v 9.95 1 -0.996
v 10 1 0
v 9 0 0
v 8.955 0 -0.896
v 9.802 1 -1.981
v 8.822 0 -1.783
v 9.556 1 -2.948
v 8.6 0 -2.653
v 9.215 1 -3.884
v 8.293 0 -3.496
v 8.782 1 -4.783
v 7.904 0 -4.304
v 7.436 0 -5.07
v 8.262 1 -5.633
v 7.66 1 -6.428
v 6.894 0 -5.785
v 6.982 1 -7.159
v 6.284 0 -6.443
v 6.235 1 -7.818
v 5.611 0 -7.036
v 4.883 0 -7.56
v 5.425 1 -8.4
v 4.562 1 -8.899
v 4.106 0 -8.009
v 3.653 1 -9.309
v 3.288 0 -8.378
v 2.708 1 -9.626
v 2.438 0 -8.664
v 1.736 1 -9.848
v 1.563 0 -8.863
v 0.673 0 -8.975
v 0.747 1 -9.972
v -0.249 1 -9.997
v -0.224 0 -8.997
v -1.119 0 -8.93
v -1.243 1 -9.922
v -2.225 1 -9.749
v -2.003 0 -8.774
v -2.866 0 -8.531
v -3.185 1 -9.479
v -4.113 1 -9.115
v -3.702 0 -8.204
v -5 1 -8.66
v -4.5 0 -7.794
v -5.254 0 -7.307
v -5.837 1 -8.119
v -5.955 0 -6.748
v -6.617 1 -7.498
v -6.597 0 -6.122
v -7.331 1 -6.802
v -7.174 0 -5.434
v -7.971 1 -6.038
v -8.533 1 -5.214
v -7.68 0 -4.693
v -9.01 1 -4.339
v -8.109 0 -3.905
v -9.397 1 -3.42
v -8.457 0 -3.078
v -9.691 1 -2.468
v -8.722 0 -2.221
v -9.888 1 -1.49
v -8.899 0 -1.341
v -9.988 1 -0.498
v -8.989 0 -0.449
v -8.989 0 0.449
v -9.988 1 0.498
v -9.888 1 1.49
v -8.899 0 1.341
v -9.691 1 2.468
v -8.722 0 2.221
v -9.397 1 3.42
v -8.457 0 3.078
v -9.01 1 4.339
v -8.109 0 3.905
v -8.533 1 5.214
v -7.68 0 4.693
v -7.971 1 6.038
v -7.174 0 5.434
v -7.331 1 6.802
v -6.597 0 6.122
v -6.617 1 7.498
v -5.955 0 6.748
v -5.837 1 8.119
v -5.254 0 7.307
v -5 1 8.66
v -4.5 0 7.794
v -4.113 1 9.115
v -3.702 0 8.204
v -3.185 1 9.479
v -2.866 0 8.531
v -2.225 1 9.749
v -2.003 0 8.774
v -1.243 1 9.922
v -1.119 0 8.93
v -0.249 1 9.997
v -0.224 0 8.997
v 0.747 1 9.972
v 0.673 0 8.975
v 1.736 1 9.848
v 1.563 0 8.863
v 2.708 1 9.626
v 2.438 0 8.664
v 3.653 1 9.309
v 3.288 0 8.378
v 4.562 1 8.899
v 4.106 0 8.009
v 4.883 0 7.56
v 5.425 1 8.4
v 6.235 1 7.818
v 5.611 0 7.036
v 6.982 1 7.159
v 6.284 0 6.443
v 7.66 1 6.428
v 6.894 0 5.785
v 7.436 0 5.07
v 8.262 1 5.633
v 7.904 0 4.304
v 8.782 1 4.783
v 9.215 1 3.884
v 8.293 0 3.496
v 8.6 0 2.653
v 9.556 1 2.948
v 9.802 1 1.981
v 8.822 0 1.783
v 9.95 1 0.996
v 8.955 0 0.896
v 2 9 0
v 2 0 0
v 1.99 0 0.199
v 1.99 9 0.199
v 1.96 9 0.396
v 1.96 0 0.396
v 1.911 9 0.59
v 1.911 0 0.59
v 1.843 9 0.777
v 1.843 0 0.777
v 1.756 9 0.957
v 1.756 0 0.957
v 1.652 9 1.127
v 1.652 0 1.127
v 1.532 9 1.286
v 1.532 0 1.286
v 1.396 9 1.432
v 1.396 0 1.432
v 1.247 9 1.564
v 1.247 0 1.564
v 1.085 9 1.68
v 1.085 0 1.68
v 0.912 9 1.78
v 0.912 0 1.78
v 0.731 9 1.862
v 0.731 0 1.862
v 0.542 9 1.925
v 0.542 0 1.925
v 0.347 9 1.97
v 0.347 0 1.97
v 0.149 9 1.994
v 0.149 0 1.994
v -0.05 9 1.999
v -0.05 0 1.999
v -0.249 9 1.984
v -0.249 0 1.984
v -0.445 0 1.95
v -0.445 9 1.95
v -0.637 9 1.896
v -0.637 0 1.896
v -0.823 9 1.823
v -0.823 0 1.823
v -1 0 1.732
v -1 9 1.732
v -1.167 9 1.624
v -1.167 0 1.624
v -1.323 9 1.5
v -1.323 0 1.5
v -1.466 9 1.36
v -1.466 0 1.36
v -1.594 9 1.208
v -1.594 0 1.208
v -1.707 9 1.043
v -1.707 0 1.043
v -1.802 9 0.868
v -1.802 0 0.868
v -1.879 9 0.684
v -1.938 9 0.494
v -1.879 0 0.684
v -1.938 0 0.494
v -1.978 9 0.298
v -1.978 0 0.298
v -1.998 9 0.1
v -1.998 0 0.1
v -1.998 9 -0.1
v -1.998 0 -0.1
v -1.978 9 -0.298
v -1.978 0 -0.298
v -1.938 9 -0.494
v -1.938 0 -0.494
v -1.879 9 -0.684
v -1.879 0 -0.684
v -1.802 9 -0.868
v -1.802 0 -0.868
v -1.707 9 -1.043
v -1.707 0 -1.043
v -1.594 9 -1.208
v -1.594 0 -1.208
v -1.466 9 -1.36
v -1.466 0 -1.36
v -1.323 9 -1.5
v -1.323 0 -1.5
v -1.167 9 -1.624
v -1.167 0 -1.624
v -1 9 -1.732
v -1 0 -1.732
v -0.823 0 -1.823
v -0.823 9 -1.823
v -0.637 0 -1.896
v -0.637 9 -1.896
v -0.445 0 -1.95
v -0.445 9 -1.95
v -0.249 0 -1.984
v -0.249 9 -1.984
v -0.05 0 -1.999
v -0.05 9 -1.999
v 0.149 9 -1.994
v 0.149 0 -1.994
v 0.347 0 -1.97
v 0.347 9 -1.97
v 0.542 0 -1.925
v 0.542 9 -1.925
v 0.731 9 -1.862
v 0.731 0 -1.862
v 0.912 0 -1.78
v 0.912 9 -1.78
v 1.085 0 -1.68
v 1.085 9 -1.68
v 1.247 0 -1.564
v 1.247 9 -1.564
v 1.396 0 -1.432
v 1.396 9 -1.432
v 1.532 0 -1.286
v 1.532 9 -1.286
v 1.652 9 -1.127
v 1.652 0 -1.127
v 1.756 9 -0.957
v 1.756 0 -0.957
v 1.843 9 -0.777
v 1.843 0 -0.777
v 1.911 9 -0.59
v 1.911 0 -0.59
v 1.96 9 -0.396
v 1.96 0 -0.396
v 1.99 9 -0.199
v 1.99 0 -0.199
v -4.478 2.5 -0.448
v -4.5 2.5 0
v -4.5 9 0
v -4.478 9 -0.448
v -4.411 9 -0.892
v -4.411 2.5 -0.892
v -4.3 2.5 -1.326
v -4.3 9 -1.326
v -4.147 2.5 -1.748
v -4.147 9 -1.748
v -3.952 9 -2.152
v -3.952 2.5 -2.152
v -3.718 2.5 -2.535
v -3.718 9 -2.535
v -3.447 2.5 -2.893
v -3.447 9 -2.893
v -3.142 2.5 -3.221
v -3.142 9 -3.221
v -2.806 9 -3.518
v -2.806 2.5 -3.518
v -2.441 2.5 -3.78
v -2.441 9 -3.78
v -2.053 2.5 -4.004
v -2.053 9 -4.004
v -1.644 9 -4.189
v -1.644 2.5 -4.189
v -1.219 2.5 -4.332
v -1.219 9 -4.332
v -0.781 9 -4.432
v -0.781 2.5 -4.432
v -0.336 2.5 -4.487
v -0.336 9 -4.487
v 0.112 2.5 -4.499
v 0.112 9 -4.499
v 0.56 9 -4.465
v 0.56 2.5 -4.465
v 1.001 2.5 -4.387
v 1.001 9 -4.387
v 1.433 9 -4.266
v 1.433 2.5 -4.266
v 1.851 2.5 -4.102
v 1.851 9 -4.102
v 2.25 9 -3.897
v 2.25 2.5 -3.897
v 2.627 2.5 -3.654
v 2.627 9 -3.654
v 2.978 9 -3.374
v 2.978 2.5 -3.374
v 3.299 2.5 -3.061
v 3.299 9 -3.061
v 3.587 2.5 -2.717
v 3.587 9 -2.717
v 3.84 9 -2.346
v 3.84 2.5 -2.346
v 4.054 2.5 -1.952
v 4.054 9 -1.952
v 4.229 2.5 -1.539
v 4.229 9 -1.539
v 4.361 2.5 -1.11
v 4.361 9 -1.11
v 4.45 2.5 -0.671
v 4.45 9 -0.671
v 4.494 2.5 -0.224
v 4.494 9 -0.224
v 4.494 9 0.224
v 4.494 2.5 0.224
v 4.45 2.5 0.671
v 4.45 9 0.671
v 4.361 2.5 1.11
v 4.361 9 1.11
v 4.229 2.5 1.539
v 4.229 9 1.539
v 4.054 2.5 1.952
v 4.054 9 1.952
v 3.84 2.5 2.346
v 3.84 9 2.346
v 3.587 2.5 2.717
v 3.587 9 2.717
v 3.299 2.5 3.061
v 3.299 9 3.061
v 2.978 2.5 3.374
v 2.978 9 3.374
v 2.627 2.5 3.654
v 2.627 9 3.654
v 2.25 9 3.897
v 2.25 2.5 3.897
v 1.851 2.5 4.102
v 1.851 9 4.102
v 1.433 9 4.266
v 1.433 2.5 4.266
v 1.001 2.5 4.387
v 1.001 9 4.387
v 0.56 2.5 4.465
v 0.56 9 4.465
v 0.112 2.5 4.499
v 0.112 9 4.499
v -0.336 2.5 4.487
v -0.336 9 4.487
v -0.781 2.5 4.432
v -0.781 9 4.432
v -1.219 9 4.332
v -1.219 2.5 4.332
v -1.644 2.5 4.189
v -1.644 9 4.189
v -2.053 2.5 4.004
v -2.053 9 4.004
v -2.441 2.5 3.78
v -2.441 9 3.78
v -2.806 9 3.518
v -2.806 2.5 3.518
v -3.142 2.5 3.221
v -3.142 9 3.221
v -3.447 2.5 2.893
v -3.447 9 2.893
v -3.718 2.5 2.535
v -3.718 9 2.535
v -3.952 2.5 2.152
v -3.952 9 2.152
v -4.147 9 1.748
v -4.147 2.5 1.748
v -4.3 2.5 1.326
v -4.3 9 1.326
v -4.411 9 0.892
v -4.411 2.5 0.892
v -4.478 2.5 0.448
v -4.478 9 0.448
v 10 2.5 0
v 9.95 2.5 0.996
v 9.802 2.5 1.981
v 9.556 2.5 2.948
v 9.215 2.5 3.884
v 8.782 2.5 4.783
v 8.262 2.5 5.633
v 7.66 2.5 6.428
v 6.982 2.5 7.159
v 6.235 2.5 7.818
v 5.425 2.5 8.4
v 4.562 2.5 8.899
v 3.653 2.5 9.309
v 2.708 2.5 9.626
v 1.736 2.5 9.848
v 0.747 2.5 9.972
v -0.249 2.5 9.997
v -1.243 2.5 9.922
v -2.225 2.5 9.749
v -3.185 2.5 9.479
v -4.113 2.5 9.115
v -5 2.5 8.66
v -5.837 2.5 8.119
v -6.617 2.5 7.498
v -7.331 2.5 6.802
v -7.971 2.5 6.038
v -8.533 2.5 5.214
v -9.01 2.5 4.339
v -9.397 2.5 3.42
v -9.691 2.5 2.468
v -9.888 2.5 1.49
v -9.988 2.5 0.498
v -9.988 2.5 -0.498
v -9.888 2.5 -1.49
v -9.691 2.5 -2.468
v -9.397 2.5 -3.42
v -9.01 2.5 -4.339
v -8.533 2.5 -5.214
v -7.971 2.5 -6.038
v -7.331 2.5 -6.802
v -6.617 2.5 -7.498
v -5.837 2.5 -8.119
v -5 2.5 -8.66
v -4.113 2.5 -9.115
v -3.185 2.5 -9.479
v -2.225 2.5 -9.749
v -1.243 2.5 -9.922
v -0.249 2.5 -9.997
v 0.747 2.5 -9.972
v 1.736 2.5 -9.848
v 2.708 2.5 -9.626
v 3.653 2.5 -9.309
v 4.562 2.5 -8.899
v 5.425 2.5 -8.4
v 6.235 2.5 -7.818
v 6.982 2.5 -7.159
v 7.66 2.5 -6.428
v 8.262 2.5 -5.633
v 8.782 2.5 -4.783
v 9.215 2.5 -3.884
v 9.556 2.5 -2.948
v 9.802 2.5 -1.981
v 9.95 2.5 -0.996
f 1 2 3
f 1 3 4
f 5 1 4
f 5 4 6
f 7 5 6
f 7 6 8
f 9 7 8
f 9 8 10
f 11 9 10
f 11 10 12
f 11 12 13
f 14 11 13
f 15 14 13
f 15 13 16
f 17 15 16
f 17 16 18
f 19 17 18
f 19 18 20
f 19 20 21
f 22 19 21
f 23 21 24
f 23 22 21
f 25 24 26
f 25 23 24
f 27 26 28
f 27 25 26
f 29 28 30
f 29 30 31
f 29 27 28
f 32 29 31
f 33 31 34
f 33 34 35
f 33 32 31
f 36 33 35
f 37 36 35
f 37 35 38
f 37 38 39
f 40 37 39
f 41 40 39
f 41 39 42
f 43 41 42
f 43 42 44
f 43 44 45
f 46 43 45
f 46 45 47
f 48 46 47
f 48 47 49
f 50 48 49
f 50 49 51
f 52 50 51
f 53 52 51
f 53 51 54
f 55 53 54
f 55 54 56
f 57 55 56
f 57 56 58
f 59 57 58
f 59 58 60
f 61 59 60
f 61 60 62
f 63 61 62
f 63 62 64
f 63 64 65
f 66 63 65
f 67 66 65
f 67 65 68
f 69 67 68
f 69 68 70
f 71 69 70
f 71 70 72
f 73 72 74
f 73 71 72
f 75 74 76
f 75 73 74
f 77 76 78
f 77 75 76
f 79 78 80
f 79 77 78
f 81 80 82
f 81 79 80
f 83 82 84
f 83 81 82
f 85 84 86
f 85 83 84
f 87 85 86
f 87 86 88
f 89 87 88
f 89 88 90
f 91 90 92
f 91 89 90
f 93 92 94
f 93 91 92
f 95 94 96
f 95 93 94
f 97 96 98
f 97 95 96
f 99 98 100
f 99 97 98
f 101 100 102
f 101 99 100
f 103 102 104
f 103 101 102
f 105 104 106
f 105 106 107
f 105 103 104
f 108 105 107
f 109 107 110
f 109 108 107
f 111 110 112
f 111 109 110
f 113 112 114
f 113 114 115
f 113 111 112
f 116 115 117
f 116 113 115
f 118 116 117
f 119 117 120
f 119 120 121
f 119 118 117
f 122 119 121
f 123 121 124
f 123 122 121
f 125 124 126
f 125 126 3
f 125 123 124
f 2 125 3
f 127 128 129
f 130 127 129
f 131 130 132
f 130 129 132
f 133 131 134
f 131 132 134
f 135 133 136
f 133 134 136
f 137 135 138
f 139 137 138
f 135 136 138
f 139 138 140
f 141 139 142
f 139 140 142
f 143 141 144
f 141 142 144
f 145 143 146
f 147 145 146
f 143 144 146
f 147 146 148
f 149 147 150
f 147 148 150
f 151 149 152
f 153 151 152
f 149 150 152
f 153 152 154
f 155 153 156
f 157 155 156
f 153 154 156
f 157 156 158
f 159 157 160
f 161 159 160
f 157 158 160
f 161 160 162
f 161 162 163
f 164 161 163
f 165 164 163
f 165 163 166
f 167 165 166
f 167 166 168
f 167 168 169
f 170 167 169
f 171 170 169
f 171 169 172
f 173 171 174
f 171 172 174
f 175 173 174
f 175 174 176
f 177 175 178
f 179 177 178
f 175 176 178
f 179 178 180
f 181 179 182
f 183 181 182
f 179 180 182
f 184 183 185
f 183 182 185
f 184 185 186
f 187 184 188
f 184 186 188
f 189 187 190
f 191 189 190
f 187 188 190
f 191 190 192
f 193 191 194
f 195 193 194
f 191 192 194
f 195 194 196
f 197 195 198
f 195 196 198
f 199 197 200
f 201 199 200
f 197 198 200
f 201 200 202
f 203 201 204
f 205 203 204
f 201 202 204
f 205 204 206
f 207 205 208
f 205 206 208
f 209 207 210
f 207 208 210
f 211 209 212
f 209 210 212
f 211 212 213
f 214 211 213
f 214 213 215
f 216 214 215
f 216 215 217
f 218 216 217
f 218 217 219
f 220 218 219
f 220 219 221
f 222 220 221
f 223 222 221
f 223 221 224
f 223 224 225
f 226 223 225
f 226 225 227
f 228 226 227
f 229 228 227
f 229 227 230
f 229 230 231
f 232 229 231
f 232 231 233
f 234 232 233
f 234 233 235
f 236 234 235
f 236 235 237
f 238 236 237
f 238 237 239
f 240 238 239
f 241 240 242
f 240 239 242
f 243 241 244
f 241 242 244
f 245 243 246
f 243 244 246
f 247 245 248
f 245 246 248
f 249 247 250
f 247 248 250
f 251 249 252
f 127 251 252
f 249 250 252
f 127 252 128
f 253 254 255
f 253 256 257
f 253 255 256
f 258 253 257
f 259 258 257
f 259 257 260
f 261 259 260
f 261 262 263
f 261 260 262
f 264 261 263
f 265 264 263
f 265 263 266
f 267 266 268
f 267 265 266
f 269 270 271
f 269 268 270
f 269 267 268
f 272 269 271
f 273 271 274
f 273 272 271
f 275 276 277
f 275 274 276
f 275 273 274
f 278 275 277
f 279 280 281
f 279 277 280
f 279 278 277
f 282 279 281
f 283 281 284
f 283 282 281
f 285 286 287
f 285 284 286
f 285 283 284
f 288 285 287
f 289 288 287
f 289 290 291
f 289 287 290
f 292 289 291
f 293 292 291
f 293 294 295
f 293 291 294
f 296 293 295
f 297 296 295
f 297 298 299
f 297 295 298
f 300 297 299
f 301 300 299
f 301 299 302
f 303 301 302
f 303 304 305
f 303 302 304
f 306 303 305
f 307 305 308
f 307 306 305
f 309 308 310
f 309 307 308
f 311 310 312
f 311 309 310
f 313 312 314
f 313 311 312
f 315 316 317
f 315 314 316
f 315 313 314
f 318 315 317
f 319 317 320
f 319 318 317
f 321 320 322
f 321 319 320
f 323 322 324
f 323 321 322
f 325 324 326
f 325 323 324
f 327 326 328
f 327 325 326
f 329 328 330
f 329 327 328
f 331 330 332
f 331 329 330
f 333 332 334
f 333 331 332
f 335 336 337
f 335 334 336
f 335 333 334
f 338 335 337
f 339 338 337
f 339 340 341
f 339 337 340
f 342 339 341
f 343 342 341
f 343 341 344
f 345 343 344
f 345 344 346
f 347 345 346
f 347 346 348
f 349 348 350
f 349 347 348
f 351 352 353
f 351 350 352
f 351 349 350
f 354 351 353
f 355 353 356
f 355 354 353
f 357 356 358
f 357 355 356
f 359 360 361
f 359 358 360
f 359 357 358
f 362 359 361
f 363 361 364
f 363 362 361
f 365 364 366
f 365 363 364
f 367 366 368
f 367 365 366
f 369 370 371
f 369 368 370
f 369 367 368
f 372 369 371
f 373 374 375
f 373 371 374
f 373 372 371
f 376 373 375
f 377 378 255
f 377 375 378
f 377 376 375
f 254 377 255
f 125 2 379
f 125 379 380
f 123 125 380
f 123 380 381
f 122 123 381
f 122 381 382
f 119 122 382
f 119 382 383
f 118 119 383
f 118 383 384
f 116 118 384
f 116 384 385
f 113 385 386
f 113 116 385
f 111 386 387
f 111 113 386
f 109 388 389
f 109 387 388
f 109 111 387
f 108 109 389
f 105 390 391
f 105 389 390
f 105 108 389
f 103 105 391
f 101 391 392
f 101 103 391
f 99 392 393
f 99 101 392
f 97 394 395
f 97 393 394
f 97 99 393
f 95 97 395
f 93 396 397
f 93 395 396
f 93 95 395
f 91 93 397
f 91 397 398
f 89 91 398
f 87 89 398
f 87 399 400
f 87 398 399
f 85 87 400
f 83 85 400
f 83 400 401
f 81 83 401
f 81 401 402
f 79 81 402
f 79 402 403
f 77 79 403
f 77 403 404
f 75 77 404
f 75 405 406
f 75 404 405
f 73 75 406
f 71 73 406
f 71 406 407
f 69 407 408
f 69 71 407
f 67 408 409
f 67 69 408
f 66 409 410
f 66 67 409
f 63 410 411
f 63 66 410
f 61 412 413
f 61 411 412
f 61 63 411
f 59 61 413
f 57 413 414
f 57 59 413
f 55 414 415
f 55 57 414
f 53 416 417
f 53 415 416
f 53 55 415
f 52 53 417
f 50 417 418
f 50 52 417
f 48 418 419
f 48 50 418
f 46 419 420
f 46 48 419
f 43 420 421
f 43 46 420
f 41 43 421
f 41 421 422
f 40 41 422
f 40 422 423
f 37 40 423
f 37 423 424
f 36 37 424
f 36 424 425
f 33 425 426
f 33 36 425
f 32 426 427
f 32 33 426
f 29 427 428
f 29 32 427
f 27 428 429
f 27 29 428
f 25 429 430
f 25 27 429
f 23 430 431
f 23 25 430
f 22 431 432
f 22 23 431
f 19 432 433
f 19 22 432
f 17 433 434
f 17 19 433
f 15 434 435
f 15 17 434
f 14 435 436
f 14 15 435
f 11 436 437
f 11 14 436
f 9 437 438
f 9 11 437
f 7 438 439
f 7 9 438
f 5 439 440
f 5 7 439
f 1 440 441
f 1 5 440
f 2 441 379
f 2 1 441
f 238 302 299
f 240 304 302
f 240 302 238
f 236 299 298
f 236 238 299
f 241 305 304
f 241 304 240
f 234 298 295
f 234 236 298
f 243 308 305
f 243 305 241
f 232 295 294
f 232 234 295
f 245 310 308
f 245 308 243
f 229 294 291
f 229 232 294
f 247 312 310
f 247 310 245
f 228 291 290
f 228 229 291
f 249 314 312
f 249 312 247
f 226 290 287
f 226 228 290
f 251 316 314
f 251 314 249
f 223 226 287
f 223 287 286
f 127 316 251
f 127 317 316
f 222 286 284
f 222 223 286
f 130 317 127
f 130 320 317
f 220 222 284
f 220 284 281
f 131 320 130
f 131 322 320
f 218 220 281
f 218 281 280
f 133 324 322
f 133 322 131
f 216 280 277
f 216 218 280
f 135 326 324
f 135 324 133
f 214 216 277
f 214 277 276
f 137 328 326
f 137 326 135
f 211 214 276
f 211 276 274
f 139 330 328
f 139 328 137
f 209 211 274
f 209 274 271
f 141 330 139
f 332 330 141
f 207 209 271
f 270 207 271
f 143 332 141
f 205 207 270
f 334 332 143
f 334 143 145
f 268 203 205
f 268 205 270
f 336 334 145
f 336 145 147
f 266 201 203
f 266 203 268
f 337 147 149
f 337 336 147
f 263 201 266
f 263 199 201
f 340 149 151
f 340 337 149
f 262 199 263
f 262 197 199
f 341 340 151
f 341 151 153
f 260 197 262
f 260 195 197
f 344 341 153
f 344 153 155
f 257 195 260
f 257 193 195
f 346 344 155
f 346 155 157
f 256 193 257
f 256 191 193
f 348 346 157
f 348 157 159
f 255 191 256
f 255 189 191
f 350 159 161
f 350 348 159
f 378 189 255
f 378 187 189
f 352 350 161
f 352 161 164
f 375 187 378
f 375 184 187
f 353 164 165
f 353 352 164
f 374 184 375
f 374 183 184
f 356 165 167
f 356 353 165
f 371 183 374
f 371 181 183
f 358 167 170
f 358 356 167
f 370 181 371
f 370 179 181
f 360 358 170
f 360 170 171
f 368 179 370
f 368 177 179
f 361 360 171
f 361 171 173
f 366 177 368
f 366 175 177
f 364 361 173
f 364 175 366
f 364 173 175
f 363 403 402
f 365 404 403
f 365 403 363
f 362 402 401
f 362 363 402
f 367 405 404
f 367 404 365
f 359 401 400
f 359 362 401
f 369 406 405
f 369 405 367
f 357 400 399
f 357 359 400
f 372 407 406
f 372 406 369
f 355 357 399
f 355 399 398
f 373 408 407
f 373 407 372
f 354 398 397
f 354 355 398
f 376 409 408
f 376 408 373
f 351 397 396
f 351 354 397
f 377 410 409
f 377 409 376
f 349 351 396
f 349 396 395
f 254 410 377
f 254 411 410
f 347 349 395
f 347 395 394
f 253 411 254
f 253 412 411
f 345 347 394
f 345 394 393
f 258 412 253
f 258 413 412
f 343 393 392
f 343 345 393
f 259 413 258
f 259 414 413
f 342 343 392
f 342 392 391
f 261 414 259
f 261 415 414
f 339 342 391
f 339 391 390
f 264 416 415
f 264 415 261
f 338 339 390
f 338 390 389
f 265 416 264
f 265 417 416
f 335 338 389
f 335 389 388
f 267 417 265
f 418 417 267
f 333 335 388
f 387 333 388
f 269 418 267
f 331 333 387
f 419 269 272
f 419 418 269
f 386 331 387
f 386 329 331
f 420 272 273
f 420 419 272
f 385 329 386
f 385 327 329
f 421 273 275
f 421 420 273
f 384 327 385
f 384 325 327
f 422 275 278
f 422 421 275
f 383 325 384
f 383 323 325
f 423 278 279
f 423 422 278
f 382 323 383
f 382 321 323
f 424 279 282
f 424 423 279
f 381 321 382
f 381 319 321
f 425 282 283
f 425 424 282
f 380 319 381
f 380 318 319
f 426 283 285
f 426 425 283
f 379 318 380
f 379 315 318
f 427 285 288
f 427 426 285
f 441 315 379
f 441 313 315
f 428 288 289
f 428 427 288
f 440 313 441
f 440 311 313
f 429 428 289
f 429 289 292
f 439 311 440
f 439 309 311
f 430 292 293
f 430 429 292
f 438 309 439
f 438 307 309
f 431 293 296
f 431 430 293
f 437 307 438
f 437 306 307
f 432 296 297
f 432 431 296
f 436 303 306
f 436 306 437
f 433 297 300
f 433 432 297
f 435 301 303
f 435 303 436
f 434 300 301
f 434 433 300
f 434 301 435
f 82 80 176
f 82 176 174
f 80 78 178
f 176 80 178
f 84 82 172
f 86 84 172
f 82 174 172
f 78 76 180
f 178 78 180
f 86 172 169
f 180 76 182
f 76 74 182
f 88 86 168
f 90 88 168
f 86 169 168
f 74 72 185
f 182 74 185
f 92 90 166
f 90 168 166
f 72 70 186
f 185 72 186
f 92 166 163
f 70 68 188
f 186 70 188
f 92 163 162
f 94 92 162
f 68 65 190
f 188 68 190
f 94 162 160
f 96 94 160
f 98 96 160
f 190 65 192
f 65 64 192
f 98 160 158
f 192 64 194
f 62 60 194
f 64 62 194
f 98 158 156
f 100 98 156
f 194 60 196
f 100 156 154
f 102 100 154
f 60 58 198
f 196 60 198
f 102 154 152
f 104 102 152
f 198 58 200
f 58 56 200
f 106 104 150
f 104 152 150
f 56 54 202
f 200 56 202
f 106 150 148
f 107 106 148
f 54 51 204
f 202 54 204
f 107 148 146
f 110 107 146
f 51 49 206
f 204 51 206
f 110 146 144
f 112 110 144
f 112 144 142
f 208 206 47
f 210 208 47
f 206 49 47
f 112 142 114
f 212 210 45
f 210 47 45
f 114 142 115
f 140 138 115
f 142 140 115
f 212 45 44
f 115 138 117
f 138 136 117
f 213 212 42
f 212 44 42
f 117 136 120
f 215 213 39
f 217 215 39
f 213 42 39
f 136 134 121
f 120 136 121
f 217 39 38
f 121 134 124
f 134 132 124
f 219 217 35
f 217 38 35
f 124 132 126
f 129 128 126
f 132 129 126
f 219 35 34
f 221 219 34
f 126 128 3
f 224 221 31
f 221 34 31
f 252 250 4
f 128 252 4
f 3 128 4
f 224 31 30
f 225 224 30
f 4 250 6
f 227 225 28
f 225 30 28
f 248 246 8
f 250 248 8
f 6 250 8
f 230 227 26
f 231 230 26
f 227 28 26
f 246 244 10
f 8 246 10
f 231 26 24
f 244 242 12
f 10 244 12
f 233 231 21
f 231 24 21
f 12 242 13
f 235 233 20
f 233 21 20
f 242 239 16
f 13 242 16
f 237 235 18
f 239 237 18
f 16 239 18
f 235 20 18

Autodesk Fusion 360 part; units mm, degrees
sketch "スケッチ1" plane through (0, 0, 0) normal (0, 1, 0) x (1, 0, 0)
  circle A0 centre (0, 0) radius 10
  dimension "d1" = 20
extrude "押し出し1" add sketch "スケッチ1" along normal blind 2.5
sketch "スケッチ2" plane through (0, 2.5, 0) normal (0, 1, 0) x (-1, 0, 0)
  circle A0 centre (0, 0) radius 10
  circle A1 centre (0, 0) radius 4.5
  dimension "d4" = 9
extrude "押し出し2" add sketch "スケッチ2" along normal blind 6.5 contours A1
sketch "スケッチ4" plane through (0, 0, 0) normal (0, -1, 0) x (1, 0, 0)
  circle A0 centre (0, 0) radius 2
  circle A1 centre (0, 0) radius 10
  dimension "d9" = 4
extrude "押し出し3" cut sketch "スケッチ4" against normal blind 16 contours A0
sketch "スケッチ5" plane through (0, 0, 0) normal (0, 0, 1) x (1, 0, 0)
  line L0 (10, 0) -> (10, 1)
  line L1 (10, 1) -> (9, 0)
  line L2 (9, 0) -> (10, 0)
revolve "回転2" cut sketch "スケッチ5" angle 360 about axis through (0, 1.75, 0) along (0, 1, 0)
